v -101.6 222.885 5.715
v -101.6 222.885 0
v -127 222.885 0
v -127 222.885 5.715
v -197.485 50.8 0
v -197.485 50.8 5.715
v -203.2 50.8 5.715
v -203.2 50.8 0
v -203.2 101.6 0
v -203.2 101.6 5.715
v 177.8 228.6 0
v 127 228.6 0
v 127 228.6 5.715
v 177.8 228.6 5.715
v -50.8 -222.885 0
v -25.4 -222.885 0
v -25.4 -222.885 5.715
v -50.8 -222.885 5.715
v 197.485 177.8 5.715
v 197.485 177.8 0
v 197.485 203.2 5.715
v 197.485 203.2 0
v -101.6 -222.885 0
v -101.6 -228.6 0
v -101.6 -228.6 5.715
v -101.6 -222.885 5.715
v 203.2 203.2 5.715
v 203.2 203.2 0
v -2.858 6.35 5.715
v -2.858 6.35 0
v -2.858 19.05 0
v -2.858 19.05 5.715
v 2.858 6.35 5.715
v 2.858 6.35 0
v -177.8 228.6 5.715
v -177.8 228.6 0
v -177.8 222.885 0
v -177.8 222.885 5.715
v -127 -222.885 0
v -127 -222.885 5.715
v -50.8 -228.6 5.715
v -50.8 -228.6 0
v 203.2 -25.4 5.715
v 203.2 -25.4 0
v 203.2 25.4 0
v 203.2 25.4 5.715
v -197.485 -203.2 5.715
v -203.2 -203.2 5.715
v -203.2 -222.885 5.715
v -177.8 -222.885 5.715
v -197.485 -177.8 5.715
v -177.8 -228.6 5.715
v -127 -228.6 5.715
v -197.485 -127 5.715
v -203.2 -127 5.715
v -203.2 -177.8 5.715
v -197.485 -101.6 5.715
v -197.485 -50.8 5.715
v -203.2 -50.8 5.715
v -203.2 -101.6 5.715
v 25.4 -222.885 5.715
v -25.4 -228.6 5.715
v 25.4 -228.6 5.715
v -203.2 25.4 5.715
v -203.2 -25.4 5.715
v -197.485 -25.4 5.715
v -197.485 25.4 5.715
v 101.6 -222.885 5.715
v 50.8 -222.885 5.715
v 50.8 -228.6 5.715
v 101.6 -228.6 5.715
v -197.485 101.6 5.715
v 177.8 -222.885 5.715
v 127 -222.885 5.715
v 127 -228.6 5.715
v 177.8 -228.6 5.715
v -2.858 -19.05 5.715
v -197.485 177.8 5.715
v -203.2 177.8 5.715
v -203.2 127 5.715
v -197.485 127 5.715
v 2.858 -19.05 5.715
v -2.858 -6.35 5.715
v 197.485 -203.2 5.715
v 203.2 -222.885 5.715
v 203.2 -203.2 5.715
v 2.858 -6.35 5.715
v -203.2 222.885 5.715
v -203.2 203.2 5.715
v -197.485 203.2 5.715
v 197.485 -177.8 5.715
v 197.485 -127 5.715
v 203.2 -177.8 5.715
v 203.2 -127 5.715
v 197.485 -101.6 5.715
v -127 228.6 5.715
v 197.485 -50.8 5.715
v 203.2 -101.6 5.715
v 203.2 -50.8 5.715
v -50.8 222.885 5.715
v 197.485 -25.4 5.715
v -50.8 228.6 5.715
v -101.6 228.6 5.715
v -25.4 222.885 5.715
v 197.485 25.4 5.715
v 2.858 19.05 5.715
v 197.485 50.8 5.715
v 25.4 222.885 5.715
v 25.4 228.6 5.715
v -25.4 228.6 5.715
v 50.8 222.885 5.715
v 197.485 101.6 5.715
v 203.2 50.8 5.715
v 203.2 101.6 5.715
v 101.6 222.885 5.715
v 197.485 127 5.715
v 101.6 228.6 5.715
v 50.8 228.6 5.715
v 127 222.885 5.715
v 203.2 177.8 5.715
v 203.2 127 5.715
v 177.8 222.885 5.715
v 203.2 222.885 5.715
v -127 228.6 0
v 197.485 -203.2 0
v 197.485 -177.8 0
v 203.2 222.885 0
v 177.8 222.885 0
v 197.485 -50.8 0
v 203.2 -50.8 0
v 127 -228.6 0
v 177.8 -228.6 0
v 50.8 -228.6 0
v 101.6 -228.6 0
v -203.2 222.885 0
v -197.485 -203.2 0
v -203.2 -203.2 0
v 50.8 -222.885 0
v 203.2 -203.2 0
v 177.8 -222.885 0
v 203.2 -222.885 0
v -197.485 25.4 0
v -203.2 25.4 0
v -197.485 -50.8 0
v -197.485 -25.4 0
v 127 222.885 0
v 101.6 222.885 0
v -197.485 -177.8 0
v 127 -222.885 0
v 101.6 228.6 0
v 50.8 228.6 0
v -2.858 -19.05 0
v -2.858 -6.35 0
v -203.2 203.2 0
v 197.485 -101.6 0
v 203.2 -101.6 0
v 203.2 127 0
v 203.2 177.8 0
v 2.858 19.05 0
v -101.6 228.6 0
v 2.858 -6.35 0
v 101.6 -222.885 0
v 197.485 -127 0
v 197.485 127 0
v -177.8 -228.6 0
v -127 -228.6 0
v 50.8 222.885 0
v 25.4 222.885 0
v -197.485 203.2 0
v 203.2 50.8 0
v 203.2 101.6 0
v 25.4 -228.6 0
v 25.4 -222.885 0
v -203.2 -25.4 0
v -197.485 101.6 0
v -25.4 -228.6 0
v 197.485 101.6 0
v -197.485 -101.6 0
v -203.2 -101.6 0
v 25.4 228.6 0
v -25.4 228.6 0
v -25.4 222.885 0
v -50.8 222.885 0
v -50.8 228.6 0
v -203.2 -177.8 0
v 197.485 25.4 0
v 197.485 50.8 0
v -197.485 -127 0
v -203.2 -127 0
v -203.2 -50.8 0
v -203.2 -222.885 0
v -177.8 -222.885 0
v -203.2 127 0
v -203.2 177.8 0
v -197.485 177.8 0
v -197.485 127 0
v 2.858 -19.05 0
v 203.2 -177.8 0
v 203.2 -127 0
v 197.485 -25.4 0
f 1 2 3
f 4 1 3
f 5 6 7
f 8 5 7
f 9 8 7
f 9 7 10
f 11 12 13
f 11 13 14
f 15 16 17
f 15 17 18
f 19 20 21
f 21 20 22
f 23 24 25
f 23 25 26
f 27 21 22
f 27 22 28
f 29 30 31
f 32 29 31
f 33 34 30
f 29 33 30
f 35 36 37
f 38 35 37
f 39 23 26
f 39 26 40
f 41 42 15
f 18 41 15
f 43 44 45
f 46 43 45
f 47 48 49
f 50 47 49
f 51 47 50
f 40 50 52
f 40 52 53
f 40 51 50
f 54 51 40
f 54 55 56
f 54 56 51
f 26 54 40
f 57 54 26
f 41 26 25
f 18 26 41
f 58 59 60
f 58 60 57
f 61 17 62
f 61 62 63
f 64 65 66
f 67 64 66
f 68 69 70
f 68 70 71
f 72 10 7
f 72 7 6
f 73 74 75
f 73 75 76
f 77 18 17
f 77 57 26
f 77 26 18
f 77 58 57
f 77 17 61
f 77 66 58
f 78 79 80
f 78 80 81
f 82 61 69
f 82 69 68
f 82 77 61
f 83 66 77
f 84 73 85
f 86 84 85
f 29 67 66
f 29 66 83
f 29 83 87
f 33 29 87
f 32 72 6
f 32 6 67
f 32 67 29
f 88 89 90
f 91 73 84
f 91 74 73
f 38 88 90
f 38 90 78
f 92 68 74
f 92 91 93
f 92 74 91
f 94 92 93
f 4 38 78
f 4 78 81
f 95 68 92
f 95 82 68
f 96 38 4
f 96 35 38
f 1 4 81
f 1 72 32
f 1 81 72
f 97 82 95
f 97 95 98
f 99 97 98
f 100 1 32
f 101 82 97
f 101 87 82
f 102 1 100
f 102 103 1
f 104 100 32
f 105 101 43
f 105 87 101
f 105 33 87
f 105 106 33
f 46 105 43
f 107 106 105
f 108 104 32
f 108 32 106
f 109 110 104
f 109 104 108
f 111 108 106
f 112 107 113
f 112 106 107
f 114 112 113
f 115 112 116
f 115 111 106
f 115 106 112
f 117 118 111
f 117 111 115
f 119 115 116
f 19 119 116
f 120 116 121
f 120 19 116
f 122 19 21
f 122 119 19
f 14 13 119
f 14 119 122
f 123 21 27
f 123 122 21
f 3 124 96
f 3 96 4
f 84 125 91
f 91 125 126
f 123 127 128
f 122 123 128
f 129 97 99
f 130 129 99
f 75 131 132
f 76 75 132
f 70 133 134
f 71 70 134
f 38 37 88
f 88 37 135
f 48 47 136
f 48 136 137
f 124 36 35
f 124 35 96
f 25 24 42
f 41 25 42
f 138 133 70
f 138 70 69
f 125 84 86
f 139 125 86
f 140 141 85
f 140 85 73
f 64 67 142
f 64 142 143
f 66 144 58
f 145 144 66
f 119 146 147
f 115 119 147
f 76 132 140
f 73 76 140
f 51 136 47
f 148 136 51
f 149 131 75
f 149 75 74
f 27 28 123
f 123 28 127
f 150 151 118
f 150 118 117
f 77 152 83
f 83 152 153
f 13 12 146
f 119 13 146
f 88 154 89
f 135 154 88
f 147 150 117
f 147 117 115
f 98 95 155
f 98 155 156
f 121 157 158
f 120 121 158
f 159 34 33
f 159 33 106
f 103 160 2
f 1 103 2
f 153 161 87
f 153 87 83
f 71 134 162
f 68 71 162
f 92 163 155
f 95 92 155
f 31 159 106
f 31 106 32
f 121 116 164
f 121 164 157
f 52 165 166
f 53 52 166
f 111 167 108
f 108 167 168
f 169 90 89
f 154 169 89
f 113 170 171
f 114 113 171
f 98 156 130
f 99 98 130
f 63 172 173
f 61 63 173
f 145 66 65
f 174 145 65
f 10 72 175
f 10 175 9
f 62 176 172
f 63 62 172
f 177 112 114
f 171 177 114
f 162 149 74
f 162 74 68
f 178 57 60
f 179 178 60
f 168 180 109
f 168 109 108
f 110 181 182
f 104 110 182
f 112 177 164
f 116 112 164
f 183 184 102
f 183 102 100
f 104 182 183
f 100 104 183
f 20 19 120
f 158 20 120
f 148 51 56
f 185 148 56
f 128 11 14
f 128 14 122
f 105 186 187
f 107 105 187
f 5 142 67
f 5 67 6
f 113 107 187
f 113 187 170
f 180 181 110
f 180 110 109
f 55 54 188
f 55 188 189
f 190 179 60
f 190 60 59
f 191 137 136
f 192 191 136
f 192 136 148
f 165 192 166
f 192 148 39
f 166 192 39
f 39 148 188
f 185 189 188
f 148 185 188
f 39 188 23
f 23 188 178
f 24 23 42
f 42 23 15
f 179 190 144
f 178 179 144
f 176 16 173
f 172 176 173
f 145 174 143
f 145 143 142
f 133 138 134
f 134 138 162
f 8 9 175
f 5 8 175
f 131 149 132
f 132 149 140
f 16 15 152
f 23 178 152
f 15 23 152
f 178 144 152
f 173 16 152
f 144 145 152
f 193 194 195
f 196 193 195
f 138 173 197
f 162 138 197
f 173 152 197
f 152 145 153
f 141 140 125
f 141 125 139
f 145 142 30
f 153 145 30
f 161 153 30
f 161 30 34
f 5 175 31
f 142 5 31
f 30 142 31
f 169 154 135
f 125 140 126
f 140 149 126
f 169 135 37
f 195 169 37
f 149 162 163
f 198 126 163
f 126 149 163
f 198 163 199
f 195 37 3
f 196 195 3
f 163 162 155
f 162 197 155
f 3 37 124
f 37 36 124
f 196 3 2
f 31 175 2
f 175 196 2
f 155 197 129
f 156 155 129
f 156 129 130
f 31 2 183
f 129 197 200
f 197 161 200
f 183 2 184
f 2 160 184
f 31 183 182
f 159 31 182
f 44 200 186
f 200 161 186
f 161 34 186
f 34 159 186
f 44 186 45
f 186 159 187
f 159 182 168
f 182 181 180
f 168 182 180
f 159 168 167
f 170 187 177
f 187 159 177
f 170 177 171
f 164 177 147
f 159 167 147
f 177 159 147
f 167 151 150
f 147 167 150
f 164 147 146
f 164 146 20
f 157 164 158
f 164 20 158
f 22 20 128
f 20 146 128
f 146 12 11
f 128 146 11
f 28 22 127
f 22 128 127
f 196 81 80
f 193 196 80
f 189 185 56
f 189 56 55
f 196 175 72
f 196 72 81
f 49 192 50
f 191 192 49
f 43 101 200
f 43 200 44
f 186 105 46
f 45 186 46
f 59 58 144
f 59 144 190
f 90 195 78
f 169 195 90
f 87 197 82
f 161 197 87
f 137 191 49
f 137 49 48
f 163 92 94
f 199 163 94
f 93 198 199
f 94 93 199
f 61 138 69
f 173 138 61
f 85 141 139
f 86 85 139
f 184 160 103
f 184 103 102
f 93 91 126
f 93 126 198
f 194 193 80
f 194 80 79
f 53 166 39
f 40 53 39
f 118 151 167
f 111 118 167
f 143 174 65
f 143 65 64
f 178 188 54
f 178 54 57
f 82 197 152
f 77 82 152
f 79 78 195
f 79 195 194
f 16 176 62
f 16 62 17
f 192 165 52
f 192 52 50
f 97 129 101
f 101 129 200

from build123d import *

# Parameters (mm, degrees)
SKETCH1_W                = 406.4
SKETCH1_H                = 457.2
BOSS_EXTRUDE1_DEPTH      = 5.715
SKETCH4_W                = 25.4
SKETCH4_H                = 5.715
FRONT_JIGSAW_DEPTH       = 6.715
SKETCH5_W                = 5.715
SKETCH5_H                = 25.4
RIGHT_JIGSAW_DEPTH       = 6.715
SKETCH7_W                = 5.715
SKETCH7_H                = 12.7
CENTER_SUPPORT_JIG_DEPTH = 6.715


with BuildPart() as part:
    # Sketch1 → Boss-Extrude1 (new body)
    with BuildSketch(Plane.XY):
        Rectangle(SKETCH1_W, SKETCH1_H)
    extrude(amount=BOSS_EXTRUDE1_DEPTH)

    # Sketch4 → Front Jigsaw (cut, through all)
    with BuildSketch(Plane(origin=(0, 0, 0), x_dir=(-1, 0, 0), z_dir=(0, 0, -1))):
        with Locations((-114.3, -225.7425)):
            Rectangle(SKETCH4_W, SKETCH4_H)
        with Locations((-190.5, -225.7425)):
            Rectangle(SKETCH4_W, SKETCH4_H)
        with Locations((-38.1, -225.7425)):
            Rectangle(SKETCH4_W, SKETCH4_H)
        with Locations((38.1, -225.7425)):
            Rectangle(SKETCH4_W, SKETCH4_H)
        with Locations((114.3, -225.7425)):
            Rectangle(SKETCH4_W, SKETCH4_H)
        with Locations((190.5, -225.7425)):
            Rectangle(SKETCH4_W, SKETCH4_H)
    front_jigsaw = extrude(amount=-FRONT_JIGSAW_DEPTH, mode=Mode.SUBTRACT)

    # Back Jigsaw: Front Jigsaw across plane
    add(front_jigsaw.mirror(Plane.ZX), mode=Mode.SUBTRACT)

    # Sketch5 → Right Jigsaw (cut, through all)
    with BuildSketch(Plane(origin=(0, 0, 0), x_dir=(-1, 0, 0), z_dir=(0, 0, -1))):
        with Locations((200.3425, 190.5)):
            Rectangle(SKETCH5_W, SKETCH5_H)
        with Locations((200.3425, 114.3)):
            Rectangle(SKETCH5_W, SKETCH5_H)
        with Locations((200.3425, 38.1)):
            Rectangle(SKETCH5_W, SKETCH5_H)
        with Locations((200.3425, -38.1)):
            Rectangle(SKETCH5_W, SKETCH5_H)
        with Locations((200.3425, -114.3)):
            Rectangle(SKETCH5_W, SKETCH5_H)
        with Locations((200.3425, -190.5)):
            Rectangle(SKETCH5_W, SKETCH5_H)
    right_jigsaw = extrude(amount=-RIGHT_JIGSAW_DEPTH, mode=Mode.SUBTRACT)

    # Left Jigsaw: Right Jigsaw across plane
    add(right_jigsaw.mirror(Plane(origin=(0, 0, 0), x_dir=(0, 0, 1), z_dir=(1, 0, 0))), mode=Mode.SUBTRACT)

    # Sketch7 → Center Support Jig (cut, through all)
    with BuildSketch(Plane(origin=(0, 0, 0), x_dir=(-1, 0, 0), z_dir=(0, 0, -1))):
        with Locations((0, 12.7)):
            Rectangle(SKETCH7_W, SKETCH7_H)
        with Locations((0, -12.7)):
            Rectangle(SKETCH7_W, SKETCH7_H)
    extrude(amount=-CENTER_SUPPORT_JIG_DEPTH, mode=Mode.SUBTRACT)


solid = part.part
